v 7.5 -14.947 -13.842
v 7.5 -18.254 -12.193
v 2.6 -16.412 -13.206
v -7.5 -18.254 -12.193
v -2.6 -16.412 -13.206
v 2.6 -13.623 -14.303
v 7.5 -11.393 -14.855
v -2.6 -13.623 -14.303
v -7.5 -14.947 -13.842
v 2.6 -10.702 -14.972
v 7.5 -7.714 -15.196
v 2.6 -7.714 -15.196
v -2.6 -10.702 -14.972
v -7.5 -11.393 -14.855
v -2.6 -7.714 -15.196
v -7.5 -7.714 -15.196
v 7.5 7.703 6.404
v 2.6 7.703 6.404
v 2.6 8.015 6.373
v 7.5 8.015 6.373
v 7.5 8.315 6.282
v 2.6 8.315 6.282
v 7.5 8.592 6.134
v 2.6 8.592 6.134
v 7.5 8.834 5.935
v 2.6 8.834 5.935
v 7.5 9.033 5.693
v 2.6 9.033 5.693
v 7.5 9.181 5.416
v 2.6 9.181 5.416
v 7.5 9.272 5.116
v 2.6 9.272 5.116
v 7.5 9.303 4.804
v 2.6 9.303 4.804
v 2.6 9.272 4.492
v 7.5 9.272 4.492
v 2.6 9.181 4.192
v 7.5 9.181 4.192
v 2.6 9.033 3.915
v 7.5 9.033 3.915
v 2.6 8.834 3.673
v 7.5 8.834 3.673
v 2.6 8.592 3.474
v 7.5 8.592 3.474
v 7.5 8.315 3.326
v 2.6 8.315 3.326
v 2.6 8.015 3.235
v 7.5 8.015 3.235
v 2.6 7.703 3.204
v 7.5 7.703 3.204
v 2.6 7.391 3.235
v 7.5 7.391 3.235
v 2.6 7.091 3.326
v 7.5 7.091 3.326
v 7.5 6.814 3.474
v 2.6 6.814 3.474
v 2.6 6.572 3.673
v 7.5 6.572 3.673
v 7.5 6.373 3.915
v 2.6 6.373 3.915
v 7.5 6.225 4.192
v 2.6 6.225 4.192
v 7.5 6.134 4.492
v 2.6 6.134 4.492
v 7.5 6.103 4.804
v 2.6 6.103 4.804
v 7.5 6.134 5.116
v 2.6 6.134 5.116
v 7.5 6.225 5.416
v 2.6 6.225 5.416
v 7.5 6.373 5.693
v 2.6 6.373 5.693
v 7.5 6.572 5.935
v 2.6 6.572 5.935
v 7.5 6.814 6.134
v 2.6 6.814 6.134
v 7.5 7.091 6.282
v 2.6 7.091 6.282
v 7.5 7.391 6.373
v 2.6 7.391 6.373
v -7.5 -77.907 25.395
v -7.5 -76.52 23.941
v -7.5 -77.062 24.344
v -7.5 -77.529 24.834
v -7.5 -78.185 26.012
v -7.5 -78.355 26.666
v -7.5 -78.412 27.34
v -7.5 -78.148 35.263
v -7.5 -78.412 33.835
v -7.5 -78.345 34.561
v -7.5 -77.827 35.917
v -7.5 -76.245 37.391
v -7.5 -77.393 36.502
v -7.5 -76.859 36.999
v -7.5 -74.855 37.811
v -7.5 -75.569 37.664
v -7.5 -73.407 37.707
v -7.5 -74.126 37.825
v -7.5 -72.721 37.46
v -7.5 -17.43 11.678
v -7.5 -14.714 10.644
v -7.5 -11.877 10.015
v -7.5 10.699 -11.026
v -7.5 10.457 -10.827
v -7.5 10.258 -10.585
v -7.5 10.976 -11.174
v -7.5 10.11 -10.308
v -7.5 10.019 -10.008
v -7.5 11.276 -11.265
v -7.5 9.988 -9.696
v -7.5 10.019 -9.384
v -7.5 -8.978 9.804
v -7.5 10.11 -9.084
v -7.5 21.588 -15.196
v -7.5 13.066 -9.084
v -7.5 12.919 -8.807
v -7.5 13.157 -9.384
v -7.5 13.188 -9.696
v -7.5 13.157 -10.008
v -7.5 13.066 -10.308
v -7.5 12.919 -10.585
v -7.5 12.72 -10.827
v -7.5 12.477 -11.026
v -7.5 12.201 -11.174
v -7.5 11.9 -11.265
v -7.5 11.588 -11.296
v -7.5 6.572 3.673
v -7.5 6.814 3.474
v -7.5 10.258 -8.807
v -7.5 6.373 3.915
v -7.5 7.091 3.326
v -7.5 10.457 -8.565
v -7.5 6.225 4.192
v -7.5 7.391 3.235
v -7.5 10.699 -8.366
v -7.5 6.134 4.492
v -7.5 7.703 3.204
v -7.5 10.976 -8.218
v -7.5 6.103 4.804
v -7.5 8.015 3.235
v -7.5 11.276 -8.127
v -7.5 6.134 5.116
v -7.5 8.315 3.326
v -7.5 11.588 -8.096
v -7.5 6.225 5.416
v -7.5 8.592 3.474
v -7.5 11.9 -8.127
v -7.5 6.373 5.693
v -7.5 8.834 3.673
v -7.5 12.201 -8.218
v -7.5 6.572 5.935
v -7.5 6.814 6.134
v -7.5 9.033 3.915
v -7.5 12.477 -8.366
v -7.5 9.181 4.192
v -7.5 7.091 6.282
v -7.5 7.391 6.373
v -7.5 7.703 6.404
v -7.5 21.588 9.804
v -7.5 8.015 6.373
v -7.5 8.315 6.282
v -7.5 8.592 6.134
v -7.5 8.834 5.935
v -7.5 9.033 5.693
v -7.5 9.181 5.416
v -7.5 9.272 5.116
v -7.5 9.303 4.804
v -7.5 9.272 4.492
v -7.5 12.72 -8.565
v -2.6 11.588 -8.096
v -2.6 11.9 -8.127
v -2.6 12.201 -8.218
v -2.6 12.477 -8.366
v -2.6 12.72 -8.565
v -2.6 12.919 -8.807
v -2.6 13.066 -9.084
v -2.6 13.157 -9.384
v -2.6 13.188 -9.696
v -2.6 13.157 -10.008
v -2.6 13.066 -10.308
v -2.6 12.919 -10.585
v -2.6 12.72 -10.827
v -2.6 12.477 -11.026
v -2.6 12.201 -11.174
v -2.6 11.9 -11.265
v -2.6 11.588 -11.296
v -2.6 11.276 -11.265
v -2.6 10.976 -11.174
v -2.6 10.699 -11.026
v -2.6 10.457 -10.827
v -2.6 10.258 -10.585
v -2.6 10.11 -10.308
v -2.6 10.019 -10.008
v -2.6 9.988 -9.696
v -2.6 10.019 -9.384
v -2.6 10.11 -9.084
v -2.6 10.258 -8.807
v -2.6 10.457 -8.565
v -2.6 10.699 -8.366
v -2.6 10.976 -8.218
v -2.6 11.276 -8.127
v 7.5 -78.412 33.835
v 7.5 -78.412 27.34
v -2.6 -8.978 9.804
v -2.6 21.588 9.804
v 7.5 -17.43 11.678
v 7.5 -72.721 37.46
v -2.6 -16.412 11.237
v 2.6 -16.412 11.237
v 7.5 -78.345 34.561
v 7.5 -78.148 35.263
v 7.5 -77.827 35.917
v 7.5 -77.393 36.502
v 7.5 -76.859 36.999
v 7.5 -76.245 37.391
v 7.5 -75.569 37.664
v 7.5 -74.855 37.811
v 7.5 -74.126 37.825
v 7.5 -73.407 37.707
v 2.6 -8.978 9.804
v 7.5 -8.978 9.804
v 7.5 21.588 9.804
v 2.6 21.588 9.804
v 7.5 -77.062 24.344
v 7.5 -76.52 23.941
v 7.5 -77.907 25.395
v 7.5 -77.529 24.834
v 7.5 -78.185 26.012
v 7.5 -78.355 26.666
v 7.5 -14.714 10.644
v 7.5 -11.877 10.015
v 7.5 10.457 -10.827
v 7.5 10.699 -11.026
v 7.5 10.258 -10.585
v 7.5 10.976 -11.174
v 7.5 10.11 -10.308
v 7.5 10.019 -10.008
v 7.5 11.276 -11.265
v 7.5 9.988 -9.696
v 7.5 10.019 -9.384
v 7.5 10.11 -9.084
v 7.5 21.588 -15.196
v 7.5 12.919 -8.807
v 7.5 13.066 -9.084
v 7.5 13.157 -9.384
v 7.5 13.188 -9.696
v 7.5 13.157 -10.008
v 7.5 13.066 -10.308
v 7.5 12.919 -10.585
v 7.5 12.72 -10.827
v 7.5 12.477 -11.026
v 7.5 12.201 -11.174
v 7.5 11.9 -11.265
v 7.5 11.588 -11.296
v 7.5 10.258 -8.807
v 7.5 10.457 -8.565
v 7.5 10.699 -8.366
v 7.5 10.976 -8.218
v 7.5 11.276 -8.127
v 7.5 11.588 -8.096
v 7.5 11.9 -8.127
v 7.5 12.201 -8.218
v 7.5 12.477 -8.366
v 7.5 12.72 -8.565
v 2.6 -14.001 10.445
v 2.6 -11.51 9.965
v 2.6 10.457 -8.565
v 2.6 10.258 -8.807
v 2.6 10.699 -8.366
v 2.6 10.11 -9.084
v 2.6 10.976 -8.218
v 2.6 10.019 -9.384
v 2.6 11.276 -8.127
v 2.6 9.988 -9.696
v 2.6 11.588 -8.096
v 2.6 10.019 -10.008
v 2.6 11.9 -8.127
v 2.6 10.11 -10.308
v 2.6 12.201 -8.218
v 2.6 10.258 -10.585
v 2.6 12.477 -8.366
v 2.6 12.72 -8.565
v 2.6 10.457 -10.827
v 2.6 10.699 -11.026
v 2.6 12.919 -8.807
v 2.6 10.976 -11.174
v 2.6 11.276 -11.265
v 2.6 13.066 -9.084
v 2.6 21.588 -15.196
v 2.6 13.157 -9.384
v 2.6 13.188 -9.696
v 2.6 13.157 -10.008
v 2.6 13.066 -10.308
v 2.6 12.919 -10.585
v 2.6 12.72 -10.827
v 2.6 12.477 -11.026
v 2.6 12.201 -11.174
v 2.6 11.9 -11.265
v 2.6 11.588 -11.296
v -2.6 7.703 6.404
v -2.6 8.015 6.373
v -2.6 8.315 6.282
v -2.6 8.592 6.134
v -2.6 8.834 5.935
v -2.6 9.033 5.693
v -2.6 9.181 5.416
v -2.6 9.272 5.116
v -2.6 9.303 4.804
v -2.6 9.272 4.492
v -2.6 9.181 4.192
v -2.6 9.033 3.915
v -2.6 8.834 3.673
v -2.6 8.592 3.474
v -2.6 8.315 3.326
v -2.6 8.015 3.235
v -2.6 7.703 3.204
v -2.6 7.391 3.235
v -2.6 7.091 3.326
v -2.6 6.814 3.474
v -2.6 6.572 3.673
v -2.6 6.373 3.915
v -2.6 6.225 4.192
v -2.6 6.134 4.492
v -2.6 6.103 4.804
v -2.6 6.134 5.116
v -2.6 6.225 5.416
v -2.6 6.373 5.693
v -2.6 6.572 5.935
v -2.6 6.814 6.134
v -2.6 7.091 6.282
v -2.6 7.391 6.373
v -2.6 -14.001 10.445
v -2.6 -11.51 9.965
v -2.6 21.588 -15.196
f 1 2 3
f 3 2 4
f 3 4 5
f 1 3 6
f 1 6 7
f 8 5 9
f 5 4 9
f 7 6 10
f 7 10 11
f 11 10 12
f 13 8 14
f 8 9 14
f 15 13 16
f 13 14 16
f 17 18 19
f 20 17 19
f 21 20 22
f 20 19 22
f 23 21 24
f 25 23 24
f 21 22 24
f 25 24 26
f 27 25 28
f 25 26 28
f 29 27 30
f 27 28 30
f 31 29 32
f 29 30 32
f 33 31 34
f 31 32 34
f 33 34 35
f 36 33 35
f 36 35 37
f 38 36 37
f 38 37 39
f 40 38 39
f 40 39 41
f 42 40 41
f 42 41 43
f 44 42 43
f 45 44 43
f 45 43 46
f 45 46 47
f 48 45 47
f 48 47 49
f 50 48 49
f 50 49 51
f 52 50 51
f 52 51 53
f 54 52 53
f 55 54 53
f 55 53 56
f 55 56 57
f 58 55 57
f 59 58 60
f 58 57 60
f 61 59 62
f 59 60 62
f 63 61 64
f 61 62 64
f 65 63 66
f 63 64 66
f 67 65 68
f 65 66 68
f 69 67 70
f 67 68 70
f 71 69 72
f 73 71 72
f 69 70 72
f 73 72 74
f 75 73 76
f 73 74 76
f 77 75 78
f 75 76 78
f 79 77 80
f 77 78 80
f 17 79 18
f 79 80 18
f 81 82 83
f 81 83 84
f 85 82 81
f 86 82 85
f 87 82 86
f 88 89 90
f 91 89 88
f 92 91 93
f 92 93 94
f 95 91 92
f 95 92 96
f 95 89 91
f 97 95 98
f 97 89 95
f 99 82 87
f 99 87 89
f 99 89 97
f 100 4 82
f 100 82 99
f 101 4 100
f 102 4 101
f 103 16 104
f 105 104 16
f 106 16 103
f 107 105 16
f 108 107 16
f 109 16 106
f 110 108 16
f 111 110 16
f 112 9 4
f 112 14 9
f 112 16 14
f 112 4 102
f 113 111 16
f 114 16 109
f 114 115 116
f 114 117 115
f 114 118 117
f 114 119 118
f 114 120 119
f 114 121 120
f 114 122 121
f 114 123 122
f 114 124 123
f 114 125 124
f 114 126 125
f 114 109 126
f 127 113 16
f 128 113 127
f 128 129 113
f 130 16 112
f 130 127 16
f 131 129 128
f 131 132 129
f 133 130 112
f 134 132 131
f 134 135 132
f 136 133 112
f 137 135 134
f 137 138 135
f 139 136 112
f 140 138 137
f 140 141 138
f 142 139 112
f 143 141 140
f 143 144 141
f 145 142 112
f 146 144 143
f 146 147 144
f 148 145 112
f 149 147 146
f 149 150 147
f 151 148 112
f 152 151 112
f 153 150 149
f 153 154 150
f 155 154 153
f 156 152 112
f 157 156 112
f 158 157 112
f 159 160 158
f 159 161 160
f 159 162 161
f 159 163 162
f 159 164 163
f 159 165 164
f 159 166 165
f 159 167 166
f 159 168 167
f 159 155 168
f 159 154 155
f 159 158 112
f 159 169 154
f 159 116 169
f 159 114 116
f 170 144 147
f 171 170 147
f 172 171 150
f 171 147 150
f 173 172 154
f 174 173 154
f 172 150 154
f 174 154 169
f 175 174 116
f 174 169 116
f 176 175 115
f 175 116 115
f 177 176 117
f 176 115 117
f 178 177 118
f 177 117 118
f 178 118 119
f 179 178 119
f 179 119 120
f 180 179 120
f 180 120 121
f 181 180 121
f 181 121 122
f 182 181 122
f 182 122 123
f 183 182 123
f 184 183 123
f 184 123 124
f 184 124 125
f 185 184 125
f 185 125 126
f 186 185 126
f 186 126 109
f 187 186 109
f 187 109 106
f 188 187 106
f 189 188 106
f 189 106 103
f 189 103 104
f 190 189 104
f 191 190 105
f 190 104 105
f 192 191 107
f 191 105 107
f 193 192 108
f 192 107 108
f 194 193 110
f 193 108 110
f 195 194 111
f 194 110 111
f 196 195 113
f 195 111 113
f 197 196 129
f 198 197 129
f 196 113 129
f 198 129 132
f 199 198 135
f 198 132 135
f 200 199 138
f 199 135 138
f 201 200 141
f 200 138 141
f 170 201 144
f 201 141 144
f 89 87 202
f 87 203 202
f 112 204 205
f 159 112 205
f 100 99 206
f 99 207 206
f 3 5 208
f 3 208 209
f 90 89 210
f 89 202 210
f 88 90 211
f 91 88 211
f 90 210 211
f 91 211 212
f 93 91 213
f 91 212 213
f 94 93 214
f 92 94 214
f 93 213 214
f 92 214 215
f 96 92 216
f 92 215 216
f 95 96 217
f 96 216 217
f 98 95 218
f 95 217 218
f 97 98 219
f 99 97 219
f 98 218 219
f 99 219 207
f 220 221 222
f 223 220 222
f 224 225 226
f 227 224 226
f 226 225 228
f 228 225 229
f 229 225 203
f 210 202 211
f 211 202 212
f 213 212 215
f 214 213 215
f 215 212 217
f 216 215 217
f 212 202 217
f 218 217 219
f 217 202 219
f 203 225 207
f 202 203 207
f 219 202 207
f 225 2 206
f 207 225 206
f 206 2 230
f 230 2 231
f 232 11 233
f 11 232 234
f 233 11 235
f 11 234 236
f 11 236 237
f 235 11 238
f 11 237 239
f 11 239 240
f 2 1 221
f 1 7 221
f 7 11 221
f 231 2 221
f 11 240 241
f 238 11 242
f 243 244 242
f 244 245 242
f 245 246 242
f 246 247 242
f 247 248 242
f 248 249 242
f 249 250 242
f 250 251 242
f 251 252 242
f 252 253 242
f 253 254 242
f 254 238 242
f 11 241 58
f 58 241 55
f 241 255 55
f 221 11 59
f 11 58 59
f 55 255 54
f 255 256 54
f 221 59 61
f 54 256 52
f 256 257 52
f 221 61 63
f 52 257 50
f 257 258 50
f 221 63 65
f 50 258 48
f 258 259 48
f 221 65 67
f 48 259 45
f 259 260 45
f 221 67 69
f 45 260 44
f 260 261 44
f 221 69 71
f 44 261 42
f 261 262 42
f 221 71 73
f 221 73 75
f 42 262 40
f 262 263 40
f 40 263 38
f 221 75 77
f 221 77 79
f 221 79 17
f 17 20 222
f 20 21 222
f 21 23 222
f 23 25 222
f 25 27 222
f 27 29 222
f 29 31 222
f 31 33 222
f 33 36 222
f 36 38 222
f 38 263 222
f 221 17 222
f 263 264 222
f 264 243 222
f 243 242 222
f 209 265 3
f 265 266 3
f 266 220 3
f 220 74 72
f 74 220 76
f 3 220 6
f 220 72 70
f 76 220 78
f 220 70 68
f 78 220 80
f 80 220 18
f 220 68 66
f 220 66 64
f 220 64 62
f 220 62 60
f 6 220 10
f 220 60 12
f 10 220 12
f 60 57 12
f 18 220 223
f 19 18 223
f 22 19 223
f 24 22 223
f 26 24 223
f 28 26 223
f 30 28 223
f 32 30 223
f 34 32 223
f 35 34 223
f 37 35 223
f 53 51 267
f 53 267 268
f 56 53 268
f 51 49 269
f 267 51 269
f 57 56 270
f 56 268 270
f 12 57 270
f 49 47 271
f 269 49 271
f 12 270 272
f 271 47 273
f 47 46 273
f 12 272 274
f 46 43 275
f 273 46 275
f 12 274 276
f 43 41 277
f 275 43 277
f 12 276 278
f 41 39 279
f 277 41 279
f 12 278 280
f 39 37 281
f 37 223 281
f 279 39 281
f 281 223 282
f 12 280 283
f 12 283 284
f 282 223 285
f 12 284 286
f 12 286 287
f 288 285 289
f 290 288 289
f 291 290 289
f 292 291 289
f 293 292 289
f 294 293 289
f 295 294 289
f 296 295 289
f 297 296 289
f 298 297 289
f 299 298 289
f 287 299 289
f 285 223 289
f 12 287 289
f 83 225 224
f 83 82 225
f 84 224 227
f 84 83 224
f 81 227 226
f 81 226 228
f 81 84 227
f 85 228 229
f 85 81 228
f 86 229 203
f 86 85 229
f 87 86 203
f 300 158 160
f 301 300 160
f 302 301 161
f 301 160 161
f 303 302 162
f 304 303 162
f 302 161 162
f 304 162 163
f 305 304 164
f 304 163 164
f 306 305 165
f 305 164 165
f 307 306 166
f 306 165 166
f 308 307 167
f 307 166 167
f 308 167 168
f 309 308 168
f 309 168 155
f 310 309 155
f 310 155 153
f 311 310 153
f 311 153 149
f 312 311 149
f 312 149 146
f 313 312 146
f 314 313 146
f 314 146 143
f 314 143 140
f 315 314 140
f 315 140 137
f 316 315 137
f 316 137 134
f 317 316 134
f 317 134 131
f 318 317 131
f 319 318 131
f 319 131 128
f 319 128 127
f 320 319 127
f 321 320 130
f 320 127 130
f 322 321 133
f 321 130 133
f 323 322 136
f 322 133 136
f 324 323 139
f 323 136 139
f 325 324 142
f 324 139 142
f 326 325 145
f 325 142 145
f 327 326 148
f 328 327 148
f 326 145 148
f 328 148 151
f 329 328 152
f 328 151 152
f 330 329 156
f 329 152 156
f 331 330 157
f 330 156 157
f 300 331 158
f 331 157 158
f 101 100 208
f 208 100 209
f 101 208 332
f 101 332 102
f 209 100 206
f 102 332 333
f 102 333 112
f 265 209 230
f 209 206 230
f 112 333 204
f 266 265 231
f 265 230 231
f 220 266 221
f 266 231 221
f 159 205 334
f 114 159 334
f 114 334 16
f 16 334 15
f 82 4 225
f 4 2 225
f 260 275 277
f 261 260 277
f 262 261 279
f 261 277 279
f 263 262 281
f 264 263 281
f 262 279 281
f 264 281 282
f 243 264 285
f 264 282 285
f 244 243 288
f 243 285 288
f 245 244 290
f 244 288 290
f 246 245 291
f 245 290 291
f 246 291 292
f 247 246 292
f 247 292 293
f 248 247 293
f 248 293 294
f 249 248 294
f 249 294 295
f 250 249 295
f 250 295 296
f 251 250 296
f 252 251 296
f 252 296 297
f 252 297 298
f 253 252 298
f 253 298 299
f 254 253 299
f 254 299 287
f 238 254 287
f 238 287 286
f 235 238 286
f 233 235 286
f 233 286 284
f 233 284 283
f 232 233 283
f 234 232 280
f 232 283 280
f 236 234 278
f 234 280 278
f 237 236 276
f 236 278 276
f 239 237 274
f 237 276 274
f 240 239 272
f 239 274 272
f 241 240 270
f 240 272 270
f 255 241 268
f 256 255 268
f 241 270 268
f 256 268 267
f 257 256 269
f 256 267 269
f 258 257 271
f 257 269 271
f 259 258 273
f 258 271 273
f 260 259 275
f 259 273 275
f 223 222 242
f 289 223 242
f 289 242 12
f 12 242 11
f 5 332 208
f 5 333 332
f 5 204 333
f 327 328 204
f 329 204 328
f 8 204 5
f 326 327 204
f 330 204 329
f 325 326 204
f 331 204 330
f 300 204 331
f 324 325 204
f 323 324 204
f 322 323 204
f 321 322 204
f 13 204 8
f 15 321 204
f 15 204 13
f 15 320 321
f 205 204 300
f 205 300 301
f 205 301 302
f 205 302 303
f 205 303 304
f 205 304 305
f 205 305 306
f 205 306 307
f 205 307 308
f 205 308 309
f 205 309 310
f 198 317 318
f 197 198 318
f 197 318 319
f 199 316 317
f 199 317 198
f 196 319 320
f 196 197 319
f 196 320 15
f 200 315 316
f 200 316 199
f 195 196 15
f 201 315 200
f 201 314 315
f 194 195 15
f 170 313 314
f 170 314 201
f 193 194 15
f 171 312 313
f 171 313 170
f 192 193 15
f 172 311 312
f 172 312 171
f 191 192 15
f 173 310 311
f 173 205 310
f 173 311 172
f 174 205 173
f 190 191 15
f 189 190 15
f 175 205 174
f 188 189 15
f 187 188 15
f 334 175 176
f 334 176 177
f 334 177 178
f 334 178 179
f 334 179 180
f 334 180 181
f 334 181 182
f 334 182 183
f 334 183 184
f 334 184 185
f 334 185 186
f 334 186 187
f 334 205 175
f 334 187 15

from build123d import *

# Parameters (mm, degrees)
BOSS_EXTRUDE1_DEPTH = 7.5
FILLET1_R           = 20
FILLET2_R           = 4
SKETCH2_W           = 5.2
SKETCH2_H           = 36.194595773
CUT_EXTRUDE1_DEPTH  = 38
CUT_EXTRUDE2_REACH  = 90.345
SKETCH3_R           = 1.6


with BuildPart() as part:
    # Sketch1 → Boss-Extrude1 (new, symmetric)
    with BuildSketch(Plane(origin=(0, 0, 0), x_dir=(0, 0, -1), z_dir=(1, 0, 0))):
        Polygon((-9.803921569, 21.588235294), (15.196078431, 21.588235294), (15.196078431, -13.411764706), (-25.113919349, -78.411764706), (-40.113919349, -78.411764706), (-9.803921569, -13.411764706), align=None)
    extrude(amount=BOSS_EXTRUDE1_DEPTH, both=True)

    # Fillet1
    fillet1_edges = [part.edges().sort_by_distance(p)[0] for p in [
        (0, -13.411764706, -15.196078431),
        (0, -13.411764706, 9.803921569),
    ]]
    fillet(fillet1_edges, radius=FILLET1_R)

    # Fillet2
    fillet2_edges = [part.edges().sort_by_distance(p)[0] for p in [
        (0, -78.411764706, 25.113919349),
        (0, -78.411764706, 40.113919349),
    ]]
    fillet(fillet2_edges, radius=FILLET2_R)

    # Sketch2 → Cut-Extrude1 (cut)
    with BuildSketch(Plane(origin=(0, 21.588235294, 0), x_dir=(1, 0, 0), z_dir=(0, 1, 0))):
        with Locations((0, 1.128729594)):
            Rectangle(SKETCH2_W, SKETCH2_H)
    extrude(amount=-CUT_EXTRUDE1_DEPTH, mode=Mode.SUBTRACT)

    # Cut-Extrude2: up to this face of the body (flat: up to its plane)
    cut_extrude2_end = Plane(part.part.faces().sort_by_distance((7.5, -23.945149467, 6.872044684))[0])
    # Sketch3 → Cut-Extrude2 (cut, up to the picked face)
    with BuildSketch(Plane.ZY.offset(7.5), mode=Mode.PRIVATE) as cut_extrude2_sk1:
        with Locations((-9.696078431, 11.588235294)):
            Circle(SKETCH3_R)
    cut_extrude2_tool1 = split(extrude(cut_extrude2_sk1.sketch, amount=-CUT_EXTRUDE2_REACH, mode=Mode.PRIVATE), bisect_by=cut_extrude2_end, keep=Keep.BOTH, mode=Mode.PRIVATE)
    # Sketch3 → Cut-Extrude2 (cut, up to the picked face)
    with BuildSketch(Plane.ZY.offset(7.5), mode=Mode.PRIVATE) as cut_extrude2_sk2:
        with Locations((4.803921569, 7.702972004)):
            Circle(SKETCH3_R)
    cut_extrude2_tool2 = split(extrude(cut_extrude2_sk2.sketch, amount=-CUT_EXTRUDE2_REACH, mode=Mode.PRIVATE), bisect_by=cut_extrude2_end, keep=Keep.BOTH, mode=Mode.PRIVATE)
    add(cut_extrude2_tool1.solids().sort_by(Axis((-7.5, 11.588235, -9.696078), (1, 0, 0)))[0], mode=Mode.SUBTRACT)
    add(cut_extrude2_tool2.solids().sort_by(Axis((-7.5, 7.702972, 4.803922), (1, 0, 0)))[0], mode=Mode.SUBTRACT)


solid = part.part
